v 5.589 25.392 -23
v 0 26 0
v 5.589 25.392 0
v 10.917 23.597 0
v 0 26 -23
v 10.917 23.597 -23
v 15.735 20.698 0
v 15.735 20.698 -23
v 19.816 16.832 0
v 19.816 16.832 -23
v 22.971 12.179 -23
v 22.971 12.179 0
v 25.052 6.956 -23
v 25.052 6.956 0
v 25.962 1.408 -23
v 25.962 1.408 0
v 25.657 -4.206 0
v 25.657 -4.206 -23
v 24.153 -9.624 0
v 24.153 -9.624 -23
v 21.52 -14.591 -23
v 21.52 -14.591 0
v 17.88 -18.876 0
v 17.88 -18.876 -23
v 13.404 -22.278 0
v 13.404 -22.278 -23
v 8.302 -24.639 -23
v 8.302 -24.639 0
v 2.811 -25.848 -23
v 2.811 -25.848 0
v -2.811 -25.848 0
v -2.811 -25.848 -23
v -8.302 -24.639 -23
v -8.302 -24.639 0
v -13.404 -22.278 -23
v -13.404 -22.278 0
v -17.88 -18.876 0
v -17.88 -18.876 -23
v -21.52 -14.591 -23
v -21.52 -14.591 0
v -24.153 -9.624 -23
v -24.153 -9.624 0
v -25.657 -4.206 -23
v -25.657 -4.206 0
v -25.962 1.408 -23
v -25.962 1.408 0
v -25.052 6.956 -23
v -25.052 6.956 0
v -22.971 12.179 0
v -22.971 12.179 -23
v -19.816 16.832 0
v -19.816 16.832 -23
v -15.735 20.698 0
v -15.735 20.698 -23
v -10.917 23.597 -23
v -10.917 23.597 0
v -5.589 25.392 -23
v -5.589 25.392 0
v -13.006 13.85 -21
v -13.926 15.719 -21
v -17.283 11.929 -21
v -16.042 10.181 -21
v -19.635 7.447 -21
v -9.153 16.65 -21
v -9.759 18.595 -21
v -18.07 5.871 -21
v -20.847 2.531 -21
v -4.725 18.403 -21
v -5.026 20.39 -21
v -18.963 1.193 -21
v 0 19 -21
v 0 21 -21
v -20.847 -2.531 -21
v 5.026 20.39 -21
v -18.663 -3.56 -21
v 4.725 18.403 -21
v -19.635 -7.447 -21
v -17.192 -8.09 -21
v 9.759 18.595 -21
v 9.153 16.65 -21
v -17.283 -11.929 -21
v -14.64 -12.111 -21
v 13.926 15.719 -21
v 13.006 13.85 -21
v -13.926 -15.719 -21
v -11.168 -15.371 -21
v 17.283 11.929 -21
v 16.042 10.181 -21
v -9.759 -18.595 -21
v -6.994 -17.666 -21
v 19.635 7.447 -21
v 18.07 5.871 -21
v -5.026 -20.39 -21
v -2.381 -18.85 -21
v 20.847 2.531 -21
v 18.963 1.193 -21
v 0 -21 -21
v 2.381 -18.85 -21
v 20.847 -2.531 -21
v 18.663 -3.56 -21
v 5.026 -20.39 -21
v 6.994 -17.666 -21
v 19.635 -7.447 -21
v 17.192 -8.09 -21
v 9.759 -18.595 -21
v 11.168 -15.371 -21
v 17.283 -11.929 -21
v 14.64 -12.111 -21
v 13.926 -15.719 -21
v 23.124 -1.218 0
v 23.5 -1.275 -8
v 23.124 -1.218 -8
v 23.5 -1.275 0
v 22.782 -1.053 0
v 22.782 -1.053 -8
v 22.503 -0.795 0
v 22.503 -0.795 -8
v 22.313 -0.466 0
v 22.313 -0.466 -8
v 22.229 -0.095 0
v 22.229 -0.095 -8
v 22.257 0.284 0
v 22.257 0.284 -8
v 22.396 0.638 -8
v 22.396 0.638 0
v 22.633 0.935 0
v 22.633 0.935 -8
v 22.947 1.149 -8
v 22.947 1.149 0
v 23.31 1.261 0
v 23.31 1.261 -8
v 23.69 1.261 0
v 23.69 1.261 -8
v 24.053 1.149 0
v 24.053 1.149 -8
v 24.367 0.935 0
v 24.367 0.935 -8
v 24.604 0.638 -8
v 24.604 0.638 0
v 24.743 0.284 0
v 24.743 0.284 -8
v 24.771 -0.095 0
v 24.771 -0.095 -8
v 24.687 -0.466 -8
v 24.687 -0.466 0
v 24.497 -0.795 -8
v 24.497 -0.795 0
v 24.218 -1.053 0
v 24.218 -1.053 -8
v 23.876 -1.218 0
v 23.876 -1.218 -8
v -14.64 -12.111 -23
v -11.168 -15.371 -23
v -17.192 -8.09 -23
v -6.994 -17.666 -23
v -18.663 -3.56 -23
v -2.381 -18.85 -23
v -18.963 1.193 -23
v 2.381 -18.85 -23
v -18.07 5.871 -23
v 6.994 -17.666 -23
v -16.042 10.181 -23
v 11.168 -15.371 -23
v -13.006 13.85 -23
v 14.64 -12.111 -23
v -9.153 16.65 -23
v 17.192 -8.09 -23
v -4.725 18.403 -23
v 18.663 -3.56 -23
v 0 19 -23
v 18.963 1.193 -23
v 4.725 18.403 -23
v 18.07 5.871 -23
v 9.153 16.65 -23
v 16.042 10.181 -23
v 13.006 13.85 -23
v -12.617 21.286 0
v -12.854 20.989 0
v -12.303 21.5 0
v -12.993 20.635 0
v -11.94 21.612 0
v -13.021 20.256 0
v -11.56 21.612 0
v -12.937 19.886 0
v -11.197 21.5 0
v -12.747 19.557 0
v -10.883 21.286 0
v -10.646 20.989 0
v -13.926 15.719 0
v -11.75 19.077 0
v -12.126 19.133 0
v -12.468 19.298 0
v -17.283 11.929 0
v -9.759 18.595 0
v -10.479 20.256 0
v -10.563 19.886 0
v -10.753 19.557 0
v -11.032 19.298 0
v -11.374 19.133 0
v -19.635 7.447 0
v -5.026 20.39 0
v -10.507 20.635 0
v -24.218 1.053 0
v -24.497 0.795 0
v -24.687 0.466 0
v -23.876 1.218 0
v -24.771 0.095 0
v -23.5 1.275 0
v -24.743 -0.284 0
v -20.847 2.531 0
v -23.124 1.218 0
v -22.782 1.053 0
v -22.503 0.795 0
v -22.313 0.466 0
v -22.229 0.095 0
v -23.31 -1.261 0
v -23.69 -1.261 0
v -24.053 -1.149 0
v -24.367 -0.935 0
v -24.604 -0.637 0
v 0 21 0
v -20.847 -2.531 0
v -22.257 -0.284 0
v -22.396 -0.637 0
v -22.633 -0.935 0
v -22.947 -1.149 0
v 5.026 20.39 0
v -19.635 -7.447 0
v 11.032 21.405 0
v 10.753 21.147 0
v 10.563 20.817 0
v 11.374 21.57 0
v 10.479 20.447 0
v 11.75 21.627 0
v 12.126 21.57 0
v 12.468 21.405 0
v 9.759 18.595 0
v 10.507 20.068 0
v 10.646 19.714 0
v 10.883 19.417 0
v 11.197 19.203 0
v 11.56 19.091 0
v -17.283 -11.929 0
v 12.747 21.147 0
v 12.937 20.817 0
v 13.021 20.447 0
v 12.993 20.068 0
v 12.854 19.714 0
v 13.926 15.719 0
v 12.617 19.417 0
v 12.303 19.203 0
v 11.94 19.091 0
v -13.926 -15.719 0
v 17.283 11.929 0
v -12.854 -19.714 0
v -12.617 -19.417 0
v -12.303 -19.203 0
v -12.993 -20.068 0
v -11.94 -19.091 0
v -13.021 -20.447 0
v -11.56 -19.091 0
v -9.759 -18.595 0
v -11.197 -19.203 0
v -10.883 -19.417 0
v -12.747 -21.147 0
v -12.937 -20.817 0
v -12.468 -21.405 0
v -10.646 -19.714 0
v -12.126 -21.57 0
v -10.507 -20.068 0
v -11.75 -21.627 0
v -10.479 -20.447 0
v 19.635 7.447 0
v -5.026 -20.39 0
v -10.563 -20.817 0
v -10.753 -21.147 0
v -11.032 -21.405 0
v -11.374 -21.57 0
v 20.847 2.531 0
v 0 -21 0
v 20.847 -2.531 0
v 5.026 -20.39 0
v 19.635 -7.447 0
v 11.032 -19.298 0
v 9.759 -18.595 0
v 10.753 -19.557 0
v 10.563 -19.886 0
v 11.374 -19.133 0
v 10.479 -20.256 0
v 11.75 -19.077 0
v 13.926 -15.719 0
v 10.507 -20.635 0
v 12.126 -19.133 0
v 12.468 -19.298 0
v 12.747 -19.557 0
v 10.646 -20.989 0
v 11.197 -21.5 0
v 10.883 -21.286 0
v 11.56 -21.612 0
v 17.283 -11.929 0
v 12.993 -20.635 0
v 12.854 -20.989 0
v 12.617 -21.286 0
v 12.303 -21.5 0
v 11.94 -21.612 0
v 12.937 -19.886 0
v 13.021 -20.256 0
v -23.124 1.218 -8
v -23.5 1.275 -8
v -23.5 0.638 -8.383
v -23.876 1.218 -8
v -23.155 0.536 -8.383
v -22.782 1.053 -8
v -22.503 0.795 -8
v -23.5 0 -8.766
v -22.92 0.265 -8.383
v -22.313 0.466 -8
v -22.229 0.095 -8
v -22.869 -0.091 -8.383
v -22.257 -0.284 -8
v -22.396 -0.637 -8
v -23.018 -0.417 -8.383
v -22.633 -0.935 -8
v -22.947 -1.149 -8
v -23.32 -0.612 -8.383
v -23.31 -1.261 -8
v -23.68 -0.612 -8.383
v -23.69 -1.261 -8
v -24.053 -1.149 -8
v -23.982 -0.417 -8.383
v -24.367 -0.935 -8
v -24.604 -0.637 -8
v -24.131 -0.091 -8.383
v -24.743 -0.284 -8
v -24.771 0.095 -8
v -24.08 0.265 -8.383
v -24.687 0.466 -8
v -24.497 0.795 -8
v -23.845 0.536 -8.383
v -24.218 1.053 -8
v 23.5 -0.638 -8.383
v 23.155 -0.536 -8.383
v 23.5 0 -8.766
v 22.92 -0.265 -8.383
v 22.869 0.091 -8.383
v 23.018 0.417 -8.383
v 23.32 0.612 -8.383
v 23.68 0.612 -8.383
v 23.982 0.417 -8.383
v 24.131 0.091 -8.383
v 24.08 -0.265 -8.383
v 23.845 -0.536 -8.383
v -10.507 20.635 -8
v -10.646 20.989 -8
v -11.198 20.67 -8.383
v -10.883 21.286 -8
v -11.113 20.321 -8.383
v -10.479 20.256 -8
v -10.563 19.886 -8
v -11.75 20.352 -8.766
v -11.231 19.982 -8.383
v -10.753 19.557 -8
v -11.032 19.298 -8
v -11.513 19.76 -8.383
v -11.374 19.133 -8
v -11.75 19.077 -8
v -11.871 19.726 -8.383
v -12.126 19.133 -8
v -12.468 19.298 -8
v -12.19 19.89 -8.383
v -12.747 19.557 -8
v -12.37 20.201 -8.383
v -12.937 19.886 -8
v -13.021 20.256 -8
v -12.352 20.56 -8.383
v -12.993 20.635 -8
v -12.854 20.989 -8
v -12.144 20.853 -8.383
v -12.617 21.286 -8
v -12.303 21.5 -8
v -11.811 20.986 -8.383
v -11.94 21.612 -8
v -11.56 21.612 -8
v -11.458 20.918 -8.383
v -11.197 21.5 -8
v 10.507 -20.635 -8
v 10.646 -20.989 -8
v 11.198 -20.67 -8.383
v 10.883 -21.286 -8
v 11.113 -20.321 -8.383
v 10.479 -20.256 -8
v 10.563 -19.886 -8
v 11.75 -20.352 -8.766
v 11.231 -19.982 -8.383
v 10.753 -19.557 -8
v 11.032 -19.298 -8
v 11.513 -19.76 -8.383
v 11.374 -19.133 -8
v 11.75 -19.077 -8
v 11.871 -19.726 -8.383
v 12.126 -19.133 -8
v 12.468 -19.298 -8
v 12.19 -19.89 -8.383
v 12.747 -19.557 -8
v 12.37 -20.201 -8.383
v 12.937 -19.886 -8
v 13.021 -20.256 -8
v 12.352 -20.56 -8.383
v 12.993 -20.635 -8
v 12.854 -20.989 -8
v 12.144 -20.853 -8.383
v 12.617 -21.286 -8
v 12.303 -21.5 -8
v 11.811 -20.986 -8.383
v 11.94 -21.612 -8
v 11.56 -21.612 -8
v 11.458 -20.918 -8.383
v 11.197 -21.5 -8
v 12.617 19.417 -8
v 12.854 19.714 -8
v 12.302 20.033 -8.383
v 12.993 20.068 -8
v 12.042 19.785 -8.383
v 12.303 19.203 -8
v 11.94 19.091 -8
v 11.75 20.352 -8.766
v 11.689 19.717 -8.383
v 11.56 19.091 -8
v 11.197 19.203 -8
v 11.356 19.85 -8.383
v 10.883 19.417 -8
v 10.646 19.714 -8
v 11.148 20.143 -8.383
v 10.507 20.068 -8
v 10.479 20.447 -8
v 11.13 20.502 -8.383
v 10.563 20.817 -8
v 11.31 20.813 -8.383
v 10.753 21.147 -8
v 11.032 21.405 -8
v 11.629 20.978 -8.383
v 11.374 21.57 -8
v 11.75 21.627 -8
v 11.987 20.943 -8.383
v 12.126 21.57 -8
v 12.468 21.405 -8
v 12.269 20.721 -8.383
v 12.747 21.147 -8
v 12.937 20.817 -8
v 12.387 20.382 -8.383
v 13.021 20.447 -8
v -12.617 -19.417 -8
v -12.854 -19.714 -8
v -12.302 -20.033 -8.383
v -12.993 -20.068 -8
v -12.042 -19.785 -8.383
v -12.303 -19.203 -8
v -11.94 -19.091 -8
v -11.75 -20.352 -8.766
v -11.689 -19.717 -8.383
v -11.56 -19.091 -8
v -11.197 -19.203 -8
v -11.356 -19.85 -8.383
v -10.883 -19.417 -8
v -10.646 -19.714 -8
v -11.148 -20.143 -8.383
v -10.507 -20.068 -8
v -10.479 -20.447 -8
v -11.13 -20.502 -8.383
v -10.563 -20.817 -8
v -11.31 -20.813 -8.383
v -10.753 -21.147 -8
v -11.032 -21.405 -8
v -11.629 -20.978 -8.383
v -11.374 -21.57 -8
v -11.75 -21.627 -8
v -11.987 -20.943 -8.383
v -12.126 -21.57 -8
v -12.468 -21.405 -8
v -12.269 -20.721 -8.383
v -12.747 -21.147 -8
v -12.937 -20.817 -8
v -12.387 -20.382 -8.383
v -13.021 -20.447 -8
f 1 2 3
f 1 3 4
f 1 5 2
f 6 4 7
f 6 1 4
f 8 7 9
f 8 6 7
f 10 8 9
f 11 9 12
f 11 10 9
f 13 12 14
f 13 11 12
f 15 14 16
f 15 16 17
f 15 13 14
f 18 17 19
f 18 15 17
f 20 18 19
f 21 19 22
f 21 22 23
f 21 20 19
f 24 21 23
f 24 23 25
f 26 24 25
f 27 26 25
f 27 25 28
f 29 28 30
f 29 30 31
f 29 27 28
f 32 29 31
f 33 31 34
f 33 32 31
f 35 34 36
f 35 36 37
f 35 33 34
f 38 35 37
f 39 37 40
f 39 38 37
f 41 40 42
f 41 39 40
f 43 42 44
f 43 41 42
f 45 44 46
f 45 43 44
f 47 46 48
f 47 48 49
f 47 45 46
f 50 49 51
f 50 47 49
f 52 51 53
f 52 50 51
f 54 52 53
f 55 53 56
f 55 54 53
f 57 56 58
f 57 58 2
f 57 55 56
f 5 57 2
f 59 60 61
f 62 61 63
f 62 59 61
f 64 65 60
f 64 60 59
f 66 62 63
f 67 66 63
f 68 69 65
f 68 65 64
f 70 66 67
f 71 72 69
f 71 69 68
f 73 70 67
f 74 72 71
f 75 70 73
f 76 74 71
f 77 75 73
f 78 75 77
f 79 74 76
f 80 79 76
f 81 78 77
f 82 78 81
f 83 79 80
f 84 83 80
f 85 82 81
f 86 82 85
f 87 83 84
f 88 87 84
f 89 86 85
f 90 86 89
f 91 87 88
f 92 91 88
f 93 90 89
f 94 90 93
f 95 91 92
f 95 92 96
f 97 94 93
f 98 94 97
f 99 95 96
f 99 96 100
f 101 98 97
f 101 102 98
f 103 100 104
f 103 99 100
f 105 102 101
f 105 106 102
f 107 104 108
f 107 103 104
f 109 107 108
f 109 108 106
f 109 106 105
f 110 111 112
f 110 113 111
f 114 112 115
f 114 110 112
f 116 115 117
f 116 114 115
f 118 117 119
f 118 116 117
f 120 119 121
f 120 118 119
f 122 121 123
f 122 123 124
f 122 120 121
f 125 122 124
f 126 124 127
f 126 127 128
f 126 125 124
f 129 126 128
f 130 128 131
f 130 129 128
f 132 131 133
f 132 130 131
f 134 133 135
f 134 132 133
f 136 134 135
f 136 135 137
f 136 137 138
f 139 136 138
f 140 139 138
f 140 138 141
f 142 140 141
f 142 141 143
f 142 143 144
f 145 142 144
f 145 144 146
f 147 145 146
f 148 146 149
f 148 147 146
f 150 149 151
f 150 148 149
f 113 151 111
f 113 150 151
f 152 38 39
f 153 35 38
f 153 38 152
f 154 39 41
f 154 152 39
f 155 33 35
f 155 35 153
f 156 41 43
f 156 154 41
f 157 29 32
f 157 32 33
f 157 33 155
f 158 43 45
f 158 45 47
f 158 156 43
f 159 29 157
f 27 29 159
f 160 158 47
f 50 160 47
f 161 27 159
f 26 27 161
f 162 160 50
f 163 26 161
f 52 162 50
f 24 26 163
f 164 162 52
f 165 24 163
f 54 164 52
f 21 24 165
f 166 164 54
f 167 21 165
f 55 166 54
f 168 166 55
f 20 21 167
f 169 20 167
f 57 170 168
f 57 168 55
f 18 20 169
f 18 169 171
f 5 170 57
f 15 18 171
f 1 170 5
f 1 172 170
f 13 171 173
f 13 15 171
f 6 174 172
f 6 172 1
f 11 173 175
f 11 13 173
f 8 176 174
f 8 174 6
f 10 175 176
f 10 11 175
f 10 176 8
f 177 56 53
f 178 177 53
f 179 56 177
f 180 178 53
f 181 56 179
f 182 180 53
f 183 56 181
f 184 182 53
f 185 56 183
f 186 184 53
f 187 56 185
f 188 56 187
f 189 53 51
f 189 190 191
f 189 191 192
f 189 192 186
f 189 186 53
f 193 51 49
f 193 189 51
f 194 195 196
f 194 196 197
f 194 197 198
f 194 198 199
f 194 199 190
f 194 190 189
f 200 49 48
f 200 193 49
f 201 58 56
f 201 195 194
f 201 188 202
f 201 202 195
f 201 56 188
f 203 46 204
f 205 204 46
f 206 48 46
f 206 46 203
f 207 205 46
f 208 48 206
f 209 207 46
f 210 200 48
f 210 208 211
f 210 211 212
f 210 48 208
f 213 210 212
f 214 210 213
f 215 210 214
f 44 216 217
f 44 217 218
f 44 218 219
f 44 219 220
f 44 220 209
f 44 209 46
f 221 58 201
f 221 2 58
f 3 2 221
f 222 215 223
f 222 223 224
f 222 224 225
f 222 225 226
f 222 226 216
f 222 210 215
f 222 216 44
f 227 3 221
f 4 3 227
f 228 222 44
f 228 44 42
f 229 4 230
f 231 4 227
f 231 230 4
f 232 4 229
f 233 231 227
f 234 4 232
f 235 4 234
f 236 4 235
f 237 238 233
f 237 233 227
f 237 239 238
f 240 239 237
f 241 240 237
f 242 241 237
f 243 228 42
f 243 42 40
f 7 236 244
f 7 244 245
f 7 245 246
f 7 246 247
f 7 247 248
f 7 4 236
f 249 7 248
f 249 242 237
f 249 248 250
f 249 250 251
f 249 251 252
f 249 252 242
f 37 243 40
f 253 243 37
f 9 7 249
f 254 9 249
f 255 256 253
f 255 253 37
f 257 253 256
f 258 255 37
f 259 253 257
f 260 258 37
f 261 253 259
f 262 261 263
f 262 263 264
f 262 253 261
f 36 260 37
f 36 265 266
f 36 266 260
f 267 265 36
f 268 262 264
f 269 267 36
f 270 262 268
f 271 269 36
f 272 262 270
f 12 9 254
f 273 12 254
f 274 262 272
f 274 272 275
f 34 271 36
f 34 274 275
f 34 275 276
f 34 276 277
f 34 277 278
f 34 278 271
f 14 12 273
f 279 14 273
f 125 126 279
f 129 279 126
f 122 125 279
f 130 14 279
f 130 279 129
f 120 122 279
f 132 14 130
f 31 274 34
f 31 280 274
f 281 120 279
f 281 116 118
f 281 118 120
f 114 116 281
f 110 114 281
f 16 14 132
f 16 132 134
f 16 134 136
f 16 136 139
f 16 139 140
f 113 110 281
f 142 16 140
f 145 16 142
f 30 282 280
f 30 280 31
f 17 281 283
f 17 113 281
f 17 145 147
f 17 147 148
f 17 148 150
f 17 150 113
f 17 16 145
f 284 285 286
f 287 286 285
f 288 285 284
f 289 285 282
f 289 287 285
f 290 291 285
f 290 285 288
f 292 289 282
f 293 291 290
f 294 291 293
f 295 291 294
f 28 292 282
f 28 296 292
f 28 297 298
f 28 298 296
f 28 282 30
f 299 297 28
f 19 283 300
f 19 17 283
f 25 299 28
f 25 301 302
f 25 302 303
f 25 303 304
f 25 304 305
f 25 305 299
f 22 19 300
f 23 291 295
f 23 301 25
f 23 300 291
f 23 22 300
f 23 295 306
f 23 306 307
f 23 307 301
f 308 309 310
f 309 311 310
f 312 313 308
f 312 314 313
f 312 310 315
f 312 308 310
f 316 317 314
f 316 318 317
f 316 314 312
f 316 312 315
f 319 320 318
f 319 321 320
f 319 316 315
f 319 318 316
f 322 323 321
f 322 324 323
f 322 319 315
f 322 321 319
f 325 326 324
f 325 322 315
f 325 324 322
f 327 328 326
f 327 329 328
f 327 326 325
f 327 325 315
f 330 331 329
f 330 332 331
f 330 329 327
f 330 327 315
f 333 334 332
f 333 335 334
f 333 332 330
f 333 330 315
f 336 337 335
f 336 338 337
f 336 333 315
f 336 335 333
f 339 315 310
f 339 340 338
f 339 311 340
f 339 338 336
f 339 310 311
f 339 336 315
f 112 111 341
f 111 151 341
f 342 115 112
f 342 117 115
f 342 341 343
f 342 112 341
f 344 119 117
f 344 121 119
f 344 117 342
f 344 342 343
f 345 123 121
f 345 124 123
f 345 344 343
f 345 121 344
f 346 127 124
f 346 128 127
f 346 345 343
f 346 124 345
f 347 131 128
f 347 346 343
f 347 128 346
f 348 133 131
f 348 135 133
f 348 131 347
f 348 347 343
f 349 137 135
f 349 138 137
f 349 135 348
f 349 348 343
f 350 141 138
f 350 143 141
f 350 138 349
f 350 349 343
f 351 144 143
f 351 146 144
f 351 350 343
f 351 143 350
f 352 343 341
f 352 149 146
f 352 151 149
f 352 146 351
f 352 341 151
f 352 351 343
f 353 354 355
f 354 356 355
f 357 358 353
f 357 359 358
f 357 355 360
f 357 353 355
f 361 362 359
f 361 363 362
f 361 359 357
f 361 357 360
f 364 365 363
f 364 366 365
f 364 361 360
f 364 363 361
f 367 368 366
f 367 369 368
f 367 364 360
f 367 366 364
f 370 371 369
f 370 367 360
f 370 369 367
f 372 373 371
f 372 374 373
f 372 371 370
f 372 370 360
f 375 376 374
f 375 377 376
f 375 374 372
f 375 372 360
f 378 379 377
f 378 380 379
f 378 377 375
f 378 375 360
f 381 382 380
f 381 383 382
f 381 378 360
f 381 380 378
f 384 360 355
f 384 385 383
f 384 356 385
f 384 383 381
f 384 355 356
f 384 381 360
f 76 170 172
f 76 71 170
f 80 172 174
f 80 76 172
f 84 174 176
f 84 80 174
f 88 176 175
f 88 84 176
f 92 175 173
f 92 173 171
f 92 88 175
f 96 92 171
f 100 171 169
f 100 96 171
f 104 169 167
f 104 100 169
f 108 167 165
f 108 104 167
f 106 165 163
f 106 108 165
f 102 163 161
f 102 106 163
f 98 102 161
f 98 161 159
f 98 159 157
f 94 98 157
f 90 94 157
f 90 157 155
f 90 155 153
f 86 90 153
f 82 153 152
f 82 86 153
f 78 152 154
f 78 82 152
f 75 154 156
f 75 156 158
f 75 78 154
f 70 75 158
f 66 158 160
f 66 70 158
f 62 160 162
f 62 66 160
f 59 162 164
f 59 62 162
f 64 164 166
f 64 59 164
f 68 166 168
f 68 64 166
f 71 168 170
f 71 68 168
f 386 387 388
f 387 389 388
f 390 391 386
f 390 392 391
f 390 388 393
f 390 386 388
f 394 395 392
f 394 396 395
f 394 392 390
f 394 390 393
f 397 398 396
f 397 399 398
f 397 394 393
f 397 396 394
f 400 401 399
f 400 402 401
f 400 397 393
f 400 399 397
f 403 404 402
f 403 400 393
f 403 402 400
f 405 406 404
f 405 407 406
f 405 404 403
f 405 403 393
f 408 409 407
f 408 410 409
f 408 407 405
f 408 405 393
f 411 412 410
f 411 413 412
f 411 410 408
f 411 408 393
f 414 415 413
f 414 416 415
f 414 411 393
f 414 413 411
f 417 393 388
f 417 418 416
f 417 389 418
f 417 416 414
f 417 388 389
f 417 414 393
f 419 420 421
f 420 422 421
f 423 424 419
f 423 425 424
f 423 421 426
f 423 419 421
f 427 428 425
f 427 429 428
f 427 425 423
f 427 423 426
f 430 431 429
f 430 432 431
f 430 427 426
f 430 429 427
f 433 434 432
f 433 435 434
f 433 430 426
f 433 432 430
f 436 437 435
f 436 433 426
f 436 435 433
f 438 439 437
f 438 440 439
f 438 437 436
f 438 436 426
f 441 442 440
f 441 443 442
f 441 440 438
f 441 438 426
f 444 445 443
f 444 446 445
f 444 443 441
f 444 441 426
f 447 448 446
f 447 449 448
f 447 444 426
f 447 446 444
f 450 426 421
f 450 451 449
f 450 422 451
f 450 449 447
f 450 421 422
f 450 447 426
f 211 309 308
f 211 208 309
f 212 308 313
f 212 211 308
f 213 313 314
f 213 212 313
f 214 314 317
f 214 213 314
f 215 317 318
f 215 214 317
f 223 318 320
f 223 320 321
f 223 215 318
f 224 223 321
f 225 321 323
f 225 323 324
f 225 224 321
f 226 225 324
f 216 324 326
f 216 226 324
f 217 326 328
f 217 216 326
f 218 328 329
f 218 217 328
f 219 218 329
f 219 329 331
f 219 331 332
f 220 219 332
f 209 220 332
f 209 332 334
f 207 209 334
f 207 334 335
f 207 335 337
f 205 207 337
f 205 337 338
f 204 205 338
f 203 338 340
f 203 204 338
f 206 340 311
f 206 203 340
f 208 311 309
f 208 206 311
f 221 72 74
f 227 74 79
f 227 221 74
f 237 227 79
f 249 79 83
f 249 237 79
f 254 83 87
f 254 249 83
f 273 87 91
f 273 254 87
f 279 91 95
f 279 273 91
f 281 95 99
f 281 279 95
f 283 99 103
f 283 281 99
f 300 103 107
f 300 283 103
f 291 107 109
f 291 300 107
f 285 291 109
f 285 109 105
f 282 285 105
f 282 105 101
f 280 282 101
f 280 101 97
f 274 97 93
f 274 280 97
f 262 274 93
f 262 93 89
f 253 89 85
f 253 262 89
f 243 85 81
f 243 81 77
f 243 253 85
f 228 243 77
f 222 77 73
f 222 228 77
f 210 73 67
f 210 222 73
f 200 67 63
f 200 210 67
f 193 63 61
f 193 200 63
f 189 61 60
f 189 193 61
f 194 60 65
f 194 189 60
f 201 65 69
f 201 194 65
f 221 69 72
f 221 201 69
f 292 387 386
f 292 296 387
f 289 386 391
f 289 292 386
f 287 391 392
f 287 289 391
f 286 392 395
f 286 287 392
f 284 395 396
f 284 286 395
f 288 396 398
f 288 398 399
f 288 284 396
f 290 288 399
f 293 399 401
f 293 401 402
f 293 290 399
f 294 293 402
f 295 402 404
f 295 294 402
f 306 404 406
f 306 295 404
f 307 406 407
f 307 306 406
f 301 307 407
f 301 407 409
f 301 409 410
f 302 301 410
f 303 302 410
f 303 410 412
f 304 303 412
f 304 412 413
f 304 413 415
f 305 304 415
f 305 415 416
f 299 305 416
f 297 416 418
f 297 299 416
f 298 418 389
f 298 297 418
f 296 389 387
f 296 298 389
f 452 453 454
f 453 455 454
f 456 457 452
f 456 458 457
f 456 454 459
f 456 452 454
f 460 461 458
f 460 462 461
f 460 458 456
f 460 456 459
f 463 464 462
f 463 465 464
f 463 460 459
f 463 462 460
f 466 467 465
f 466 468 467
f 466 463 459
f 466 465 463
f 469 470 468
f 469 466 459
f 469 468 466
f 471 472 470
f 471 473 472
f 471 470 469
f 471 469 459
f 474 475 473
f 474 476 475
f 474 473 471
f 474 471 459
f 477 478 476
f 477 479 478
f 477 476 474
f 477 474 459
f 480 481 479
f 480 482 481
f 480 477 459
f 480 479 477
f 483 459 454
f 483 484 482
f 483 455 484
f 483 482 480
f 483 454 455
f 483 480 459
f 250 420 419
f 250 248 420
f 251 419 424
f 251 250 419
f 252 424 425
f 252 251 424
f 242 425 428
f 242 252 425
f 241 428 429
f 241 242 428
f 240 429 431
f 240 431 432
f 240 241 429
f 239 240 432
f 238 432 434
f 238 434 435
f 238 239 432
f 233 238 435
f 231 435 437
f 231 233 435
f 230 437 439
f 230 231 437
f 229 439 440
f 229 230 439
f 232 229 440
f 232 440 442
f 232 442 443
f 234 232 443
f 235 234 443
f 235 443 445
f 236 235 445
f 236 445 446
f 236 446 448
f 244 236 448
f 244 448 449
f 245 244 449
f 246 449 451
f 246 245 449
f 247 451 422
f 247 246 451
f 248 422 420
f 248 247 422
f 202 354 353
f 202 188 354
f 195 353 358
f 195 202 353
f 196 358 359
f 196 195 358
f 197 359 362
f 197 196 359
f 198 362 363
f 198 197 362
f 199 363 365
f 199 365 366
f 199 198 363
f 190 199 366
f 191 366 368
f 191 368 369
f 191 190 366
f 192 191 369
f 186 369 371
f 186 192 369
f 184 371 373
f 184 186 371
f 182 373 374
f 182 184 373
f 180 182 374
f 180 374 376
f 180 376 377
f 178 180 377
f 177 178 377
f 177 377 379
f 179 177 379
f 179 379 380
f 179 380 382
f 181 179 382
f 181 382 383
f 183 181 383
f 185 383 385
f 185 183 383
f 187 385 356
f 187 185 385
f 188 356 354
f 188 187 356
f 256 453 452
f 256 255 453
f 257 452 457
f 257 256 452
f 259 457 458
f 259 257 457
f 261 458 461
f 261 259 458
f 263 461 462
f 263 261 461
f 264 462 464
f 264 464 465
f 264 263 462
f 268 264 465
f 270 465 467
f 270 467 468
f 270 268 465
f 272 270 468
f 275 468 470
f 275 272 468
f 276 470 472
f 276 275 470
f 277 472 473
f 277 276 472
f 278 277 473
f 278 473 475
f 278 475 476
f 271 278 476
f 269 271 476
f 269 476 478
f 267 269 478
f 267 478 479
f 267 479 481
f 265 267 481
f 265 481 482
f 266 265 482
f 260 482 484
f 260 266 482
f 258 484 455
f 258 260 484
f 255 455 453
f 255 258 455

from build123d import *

# Parameters (mm, degrees)
PATTERN_CIRCULAR_1_COUNT = 6


with BuildPart() as part:
    # Эскиз1 → Повернуть1 (revolve)
    with BuildSketch(Plane(origin=(0, 0, 0), x_dir=(0, 0, -1), z_dir=(1, 0, 0))):
        Polygon((0, 26), (23, 26), (23, 19), (21, 19), (21, 21), (0, 21), align=None)
    revolve(axis=Axis((0, 0, 0), (0, 0, -1)))

    # Эскиз3 → Сверло под метчик  спиральное M2.51 (revolve, cut)
    with BuildSketch(Plane(origin=(23.5, 0, 0), x_dir=(0, -1, 0), z_dir=(1, 0, 0))):
        Polygon((0, 0), (0, 8.766097289), (1.275, 8), (1.275, 0), align=None)
    hole_wizard_m2_51 = revolve(axis=Axis((23.5, 0, 6.35), (0, 0, -1)), mode=Mode.SUBTRACT)

    # Круговой массив1: Сверло под метчик  спиральное M2.51 ×6 about axis
    pattern_circular_1_axis = Axis((0, 0, 0), (0, 0, 1))
    for i in range(1, PATTERN_CIRCULAR_1_COUNT):
        add(hole_wizard_m2_51.rotate(pattern_circular_1_axis, i * 360 / PATTERN_CIRCULAR_1_COUNT), mode=Mode.SUBTRACT)


solid = part.part
